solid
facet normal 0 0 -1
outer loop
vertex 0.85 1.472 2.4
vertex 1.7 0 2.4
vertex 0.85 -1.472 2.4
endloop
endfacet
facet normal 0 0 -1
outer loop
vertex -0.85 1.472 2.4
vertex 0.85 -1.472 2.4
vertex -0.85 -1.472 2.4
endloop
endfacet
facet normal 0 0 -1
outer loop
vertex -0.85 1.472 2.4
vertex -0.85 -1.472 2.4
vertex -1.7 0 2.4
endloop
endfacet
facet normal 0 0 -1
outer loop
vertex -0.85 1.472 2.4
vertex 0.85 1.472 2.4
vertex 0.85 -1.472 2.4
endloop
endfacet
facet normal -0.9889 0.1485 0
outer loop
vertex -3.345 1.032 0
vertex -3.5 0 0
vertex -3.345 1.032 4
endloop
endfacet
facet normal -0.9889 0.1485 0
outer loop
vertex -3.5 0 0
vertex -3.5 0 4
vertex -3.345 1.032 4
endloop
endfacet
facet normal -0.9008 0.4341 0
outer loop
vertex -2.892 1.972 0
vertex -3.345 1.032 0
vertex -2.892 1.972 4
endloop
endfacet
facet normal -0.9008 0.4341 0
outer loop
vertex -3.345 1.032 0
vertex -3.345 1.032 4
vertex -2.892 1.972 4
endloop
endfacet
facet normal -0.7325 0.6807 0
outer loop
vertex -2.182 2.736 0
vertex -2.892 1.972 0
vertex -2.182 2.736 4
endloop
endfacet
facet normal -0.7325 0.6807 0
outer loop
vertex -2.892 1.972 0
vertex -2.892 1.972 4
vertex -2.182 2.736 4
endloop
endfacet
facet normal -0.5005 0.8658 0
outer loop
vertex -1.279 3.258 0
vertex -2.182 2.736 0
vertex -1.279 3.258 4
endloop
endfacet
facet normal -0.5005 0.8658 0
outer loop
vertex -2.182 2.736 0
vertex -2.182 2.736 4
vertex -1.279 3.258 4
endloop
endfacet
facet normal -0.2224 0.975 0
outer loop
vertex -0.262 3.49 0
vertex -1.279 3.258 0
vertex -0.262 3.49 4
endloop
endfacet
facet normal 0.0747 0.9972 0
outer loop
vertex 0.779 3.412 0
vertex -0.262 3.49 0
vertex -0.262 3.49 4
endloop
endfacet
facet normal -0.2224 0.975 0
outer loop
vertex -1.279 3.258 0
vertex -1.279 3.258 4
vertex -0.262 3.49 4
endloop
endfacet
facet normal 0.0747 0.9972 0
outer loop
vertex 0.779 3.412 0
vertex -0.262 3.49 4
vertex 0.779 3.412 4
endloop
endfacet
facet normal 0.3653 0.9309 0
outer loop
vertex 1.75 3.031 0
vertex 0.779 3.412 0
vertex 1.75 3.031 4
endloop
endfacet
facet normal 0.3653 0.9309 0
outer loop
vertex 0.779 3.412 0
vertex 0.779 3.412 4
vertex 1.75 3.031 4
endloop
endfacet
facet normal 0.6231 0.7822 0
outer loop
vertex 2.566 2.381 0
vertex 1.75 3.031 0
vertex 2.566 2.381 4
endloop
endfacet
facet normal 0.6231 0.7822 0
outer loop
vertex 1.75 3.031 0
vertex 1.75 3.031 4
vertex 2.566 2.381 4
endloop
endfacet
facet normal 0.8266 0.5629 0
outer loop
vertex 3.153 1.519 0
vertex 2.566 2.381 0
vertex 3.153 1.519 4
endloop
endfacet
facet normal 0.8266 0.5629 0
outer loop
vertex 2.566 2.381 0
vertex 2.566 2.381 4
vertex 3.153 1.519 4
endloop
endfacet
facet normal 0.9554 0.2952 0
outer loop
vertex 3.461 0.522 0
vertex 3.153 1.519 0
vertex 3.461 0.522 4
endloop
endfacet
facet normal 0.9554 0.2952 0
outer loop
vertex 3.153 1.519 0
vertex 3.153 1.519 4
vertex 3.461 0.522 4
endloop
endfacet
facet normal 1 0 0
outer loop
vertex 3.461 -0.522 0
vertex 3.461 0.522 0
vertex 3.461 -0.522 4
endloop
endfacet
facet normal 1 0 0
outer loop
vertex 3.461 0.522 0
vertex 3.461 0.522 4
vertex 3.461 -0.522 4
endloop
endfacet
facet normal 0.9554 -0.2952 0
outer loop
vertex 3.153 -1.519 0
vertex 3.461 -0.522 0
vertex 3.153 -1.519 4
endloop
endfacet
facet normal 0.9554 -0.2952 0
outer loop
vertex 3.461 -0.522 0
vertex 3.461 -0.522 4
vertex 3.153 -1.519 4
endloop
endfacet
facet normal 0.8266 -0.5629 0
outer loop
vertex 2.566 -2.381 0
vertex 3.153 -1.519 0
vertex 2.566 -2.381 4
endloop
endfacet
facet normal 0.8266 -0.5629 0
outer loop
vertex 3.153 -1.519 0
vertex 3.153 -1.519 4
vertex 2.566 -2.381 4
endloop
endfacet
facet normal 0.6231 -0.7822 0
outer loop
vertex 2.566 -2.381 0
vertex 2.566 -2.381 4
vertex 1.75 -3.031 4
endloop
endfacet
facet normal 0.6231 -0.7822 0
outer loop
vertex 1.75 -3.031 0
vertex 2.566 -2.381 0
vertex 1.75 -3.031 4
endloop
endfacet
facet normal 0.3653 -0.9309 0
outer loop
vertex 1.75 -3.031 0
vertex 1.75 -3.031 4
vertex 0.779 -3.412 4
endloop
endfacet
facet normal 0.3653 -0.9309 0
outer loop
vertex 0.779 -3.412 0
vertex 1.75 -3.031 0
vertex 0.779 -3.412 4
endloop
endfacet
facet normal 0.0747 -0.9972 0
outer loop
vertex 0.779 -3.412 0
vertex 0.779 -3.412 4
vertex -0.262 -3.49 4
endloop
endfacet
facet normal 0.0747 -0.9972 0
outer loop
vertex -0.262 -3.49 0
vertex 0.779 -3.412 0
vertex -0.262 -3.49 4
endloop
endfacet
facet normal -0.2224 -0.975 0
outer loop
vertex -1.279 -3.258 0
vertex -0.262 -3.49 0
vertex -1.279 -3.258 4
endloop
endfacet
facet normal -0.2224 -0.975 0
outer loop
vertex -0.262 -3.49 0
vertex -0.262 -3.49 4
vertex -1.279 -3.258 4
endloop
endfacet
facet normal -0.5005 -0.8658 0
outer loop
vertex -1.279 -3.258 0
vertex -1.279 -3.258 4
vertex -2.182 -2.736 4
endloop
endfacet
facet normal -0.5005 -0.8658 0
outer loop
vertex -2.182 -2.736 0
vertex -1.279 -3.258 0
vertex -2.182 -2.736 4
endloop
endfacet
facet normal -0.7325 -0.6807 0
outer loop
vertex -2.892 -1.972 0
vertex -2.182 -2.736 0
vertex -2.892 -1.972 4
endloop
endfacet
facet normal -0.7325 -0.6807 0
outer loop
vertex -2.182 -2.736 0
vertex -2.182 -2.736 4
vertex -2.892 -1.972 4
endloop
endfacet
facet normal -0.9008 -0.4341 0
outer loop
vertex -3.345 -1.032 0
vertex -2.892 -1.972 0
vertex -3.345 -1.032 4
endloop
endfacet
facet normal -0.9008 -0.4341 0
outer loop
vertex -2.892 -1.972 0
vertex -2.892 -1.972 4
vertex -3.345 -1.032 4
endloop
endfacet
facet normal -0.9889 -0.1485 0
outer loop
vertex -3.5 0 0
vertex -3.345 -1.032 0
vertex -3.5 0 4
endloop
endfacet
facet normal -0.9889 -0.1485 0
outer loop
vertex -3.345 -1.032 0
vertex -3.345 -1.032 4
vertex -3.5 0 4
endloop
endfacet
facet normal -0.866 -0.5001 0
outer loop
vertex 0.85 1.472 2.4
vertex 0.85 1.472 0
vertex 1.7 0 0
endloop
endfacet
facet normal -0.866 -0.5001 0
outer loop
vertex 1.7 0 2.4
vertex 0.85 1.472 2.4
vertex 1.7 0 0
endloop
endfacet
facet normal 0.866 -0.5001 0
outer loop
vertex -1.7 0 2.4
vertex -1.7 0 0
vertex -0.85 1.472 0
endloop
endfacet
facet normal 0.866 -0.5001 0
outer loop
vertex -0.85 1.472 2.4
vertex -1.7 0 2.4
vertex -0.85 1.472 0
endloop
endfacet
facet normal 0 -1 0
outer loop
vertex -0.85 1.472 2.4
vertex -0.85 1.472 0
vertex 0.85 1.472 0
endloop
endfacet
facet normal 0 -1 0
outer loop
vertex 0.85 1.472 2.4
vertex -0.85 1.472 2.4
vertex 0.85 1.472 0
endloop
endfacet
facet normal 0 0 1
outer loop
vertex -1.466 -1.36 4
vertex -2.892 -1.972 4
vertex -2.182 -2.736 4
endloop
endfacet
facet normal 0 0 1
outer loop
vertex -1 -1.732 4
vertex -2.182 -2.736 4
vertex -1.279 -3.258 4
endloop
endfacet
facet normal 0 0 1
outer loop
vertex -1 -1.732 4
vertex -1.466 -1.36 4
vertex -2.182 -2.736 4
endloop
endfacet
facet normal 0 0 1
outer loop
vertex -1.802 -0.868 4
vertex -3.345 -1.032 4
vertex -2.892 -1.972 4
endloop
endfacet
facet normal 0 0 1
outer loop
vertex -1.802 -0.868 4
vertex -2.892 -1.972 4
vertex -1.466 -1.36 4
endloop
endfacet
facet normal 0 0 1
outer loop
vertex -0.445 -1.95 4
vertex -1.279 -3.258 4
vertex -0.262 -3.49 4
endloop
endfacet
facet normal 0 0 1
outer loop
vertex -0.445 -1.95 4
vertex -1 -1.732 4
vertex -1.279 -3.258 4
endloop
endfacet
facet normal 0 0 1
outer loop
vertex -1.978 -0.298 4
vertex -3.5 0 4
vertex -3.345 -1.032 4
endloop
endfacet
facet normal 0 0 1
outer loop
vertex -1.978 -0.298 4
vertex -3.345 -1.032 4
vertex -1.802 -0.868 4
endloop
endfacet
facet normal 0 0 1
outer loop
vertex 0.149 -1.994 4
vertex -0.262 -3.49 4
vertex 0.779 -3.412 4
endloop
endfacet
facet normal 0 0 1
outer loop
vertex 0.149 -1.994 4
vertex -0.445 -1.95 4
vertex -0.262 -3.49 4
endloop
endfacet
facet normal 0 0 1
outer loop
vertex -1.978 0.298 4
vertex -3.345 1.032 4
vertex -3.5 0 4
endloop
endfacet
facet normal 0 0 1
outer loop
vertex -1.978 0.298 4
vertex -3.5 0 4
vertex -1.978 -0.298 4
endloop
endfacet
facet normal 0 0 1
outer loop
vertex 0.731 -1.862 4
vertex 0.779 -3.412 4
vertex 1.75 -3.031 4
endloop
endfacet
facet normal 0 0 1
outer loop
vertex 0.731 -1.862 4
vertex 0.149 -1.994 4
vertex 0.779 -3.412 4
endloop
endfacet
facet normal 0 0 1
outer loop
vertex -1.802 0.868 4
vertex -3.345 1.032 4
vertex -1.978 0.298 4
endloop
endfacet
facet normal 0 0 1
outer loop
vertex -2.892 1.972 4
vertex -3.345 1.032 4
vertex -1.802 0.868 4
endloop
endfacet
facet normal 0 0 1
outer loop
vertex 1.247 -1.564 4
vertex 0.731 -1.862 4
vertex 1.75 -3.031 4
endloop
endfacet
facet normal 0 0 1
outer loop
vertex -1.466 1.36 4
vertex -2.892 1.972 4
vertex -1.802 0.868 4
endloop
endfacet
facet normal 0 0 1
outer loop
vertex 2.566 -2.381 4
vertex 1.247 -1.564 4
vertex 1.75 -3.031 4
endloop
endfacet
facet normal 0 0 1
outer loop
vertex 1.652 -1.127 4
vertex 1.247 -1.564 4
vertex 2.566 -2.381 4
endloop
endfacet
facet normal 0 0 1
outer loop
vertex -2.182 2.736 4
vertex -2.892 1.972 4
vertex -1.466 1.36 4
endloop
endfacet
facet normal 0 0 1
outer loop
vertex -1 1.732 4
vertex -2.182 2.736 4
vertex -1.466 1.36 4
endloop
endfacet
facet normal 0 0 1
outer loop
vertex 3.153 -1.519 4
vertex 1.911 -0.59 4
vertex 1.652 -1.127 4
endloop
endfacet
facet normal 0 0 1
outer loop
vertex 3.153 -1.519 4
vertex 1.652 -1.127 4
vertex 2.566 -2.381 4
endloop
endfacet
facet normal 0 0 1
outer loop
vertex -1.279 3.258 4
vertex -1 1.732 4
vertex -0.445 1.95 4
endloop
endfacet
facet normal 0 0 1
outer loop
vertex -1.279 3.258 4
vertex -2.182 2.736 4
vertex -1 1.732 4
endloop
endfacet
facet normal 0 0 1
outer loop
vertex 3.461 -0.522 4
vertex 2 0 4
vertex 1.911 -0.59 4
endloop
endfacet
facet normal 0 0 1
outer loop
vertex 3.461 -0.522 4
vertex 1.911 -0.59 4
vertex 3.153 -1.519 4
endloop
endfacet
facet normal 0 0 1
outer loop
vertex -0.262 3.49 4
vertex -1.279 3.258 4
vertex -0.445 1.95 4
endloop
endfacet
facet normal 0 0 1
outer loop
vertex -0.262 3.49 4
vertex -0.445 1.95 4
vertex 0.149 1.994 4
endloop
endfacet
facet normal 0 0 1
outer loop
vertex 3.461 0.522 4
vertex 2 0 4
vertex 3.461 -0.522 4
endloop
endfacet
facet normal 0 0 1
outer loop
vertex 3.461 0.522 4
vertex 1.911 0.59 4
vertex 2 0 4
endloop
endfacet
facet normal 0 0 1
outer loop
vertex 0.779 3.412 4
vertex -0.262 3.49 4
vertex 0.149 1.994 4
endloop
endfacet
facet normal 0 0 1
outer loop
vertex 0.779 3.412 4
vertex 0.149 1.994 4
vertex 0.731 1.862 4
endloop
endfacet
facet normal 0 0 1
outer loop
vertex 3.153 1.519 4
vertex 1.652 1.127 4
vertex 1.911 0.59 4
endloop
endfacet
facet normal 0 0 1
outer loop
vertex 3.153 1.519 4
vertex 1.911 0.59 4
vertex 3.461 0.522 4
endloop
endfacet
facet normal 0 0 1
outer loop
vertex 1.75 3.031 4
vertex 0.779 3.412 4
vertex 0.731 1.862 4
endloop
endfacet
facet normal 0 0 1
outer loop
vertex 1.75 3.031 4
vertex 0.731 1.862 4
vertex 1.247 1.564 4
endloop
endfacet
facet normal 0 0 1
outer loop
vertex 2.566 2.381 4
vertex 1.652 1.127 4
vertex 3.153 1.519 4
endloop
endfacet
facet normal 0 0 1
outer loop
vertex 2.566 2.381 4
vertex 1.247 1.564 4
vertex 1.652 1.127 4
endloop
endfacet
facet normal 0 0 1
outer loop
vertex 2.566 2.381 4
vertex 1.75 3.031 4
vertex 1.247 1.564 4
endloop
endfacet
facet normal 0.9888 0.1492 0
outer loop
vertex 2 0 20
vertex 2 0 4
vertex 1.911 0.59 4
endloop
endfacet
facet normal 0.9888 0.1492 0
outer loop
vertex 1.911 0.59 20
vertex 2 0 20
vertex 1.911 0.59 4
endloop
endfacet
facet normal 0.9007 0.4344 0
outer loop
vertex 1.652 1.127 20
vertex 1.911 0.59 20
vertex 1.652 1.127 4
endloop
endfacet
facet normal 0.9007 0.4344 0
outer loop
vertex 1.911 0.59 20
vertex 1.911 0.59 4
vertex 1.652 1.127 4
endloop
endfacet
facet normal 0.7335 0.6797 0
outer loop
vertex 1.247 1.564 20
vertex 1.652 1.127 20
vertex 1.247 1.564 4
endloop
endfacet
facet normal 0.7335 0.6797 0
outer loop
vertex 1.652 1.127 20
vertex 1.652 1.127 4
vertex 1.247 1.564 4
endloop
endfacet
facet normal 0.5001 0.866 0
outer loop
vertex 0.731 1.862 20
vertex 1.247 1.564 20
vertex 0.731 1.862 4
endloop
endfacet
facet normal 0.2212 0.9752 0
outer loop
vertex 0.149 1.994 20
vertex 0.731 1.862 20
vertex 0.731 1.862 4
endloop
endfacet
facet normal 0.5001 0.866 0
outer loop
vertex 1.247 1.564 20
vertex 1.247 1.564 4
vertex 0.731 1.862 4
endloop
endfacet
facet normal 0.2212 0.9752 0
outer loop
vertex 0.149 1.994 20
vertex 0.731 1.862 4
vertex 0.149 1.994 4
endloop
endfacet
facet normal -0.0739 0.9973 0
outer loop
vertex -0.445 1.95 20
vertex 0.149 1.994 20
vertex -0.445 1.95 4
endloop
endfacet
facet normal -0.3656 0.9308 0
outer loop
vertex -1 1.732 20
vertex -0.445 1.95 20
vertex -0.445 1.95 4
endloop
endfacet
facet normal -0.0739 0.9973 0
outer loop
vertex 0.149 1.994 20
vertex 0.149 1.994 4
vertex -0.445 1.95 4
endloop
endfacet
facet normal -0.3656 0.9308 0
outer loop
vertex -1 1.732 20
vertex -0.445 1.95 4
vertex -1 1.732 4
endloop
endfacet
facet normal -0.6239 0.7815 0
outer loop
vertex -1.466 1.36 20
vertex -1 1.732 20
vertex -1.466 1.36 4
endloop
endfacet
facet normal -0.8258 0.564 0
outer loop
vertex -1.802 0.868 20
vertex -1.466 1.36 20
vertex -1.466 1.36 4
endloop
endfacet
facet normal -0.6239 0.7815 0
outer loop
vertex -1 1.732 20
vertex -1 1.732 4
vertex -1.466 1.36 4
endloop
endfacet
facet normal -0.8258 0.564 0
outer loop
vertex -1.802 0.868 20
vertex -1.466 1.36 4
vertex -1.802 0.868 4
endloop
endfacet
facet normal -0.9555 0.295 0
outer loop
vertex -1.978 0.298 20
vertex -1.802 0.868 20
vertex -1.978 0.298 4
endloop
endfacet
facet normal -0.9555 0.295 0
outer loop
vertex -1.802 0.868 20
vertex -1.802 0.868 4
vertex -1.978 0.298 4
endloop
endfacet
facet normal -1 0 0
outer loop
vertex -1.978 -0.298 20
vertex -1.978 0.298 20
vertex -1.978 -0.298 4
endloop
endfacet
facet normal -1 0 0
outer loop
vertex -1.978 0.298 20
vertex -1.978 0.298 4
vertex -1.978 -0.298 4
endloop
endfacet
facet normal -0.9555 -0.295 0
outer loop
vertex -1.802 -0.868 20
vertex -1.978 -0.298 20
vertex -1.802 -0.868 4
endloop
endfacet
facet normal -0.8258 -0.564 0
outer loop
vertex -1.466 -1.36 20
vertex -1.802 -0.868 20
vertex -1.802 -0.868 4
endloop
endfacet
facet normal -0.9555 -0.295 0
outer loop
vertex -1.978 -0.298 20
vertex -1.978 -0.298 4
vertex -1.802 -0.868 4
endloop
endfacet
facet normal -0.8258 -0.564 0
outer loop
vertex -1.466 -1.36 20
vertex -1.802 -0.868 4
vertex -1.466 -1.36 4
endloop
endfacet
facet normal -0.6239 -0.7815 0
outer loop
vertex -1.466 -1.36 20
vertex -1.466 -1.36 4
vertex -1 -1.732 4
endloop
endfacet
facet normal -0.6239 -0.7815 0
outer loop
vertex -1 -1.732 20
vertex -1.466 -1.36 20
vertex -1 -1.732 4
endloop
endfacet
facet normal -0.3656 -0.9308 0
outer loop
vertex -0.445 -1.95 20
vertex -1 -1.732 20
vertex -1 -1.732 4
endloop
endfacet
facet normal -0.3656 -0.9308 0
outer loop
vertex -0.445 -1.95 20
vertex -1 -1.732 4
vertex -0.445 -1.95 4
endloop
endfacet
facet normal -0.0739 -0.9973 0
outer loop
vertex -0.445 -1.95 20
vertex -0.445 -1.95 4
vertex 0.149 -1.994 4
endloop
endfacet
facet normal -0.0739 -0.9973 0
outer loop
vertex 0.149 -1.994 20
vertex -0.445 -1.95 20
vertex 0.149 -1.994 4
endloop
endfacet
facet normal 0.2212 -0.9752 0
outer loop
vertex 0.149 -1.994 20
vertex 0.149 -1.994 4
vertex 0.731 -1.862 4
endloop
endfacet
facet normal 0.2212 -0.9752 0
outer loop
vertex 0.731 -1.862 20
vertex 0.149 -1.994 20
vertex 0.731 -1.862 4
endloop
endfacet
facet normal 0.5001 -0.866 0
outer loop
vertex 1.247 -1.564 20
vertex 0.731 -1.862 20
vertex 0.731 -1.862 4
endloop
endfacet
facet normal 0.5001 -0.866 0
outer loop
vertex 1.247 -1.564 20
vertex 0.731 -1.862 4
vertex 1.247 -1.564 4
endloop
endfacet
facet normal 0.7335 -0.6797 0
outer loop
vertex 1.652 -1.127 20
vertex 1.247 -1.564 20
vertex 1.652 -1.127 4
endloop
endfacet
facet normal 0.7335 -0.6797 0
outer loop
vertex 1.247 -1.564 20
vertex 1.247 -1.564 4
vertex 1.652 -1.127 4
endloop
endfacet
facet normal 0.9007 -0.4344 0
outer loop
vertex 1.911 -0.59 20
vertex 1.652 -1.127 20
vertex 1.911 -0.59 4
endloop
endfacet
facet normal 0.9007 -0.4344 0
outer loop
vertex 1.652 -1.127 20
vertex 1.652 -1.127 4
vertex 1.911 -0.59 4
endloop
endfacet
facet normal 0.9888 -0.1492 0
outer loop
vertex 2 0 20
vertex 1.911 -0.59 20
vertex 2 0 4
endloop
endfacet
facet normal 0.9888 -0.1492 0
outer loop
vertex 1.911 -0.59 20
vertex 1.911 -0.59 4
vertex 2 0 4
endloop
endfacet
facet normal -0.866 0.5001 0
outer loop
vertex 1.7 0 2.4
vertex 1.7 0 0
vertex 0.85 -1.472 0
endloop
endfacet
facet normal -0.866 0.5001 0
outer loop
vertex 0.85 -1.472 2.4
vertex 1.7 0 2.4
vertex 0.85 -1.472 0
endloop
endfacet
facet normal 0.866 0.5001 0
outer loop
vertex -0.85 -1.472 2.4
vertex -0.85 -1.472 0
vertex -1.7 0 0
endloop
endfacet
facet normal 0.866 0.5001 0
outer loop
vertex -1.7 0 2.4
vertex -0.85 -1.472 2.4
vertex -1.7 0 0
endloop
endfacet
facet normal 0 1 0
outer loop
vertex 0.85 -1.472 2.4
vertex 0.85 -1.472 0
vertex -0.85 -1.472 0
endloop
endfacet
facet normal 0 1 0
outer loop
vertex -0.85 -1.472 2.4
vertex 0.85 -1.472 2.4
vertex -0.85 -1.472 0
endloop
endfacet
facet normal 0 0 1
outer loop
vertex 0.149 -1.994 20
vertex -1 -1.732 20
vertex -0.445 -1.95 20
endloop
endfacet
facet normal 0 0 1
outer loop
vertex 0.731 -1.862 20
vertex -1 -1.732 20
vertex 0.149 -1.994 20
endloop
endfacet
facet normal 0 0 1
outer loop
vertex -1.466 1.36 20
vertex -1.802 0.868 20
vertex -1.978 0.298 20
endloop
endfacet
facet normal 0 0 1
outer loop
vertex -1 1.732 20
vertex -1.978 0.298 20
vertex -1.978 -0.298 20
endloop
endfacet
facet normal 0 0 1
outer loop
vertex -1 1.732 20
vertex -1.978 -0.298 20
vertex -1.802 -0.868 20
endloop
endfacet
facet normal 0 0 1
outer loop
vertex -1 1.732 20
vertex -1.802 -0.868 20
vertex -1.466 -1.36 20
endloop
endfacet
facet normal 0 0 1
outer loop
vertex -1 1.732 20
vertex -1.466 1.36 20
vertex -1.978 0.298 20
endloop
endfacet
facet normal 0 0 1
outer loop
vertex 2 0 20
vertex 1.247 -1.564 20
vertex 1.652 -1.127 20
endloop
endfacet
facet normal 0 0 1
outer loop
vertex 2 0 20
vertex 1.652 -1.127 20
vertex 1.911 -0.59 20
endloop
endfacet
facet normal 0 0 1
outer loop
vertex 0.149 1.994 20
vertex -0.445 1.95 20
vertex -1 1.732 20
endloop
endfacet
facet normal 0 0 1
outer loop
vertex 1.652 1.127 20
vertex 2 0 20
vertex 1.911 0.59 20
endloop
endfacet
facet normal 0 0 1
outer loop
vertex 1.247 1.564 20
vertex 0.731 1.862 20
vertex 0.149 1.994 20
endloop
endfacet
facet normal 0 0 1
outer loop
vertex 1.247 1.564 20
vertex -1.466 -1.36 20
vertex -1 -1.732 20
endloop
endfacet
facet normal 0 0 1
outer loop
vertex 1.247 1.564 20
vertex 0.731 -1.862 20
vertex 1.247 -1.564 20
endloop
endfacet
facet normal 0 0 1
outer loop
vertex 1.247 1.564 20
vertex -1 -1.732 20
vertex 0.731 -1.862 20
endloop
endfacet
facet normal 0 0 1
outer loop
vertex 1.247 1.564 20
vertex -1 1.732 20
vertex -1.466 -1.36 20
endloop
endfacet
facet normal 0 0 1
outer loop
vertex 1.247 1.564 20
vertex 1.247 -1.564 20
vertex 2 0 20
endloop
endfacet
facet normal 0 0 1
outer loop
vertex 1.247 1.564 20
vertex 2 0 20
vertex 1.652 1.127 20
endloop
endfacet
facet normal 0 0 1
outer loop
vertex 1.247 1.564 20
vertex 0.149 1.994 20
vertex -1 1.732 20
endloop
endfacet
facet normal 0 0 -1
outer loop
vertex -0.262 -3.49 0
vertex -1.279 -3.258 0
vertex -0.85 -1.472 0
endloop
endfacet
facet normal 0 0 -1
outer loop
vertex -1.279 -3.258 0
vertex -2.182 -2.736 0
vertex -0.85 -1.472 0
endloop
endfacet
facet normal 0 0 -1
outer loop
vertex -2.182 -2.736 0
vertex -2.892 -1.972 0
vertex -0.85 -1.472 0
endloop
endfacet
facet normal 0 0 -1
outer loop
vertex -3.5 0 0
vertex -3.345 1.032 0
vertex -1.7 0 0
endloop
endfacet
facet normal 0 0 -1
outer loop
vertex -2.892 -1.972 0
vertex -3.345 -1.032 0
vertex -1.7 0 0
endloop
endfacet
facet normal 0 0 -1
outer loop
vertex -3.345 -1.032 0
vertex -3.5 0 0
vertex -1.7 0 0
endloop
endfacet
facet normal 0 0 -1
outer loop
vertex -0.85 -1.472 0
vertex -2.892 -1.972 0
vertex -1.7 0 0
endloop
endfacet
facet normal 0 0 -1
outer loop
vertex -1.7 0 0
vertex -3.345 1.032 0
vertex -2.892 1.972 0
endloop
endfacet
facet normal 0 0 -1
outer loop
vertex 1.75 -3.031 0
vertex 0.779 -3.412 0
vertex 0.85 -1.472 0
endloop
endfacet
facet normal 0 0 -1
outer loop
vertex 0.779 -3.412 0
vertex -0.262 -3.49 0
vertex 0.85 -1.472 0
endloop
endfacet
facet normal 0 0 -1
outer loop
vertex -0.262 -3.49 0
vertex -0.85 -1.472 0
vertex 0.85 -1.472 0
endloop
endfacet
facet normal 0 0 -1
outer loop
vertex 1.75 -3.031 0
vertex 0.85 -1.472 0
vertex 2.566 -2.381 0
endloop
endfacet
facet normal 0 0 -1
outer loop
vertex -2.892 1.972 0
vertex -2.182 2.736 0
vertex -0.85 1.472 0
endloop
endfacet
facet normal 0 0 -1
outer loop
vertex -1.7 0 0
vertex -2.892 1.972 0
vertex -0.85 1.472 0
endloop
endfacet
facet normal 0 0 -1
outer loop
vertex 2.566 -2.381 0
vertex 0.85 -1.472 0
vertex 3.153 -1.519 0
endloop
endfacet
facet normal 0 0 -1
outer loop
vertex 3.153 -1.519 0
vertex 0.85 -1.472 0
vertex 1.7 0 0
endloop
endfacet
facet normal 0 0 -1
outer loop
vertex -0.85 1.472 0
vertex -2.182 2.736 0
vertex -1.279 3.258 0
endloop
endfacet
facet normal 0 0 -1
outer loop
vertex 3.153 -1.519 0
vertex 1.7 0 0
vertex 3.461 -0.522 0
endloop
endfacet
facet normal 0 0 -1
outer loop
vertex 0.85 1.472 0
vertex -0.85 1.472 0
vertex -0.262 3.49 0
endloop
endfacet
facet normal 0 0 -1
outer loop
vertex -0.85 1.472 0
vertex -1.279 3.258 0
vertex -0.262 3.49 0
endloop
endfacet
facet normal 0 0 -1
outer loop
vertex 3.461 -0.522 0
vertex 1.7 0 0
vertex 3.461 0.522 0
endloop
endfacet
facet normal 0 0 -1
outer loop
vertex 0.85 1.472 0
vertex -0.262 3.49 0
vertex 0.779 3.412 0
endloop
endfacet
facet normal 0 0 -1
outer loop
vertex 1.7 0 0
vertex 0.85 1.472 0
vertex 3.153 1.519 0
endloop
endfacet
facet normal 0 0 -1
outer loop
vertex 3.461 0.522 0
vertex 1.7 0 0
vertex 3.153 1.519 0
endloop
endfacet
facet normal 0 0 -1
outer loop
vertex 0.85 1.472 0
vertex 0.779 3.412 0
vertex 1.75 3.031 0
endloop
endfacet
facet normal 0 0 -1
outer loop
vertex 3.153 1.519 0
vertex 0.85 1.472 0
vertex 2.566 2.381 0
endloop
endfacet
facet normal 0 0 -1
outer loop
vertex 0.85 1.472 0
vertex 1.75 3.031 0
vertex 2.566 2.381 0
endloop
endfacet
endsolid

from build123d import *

# Parameters (mm, degrees)
SKETCH1_W           = 3.5
SKETCH1_H           = 4
SKETCH2_R           = 2
BOSS_EXTRUDE1_DEPTH = 16
CUT_EXTRUDE1_DEPTH  = 2.4


with BuildPart() as part:
    # Sketch1 → Revolve1 (revolve)
    with BuildSketch(Plane.XZ, mode=Mode.PRIVATE) as revolve1_sk:
        with Locations((1.75, 2)):
            Rectangle(SKETCH1_W, SKETCH1_H)
    revolve(revolve1_sk.sketch.rotate(Axis((0, 0, 4), (0, 0, -1)), 180), axis=Axis((0, 0, 4), (0, 0, -1)))

    # Sketch2 → Boss-Extrude1 (add)
    with BuildSketch(Plane.XY.offset(4)):
        Circle(SKETCH2_R)
    extrude(amount=BOSS_EXTRUDE1_DEPTH)

    # Sketch3 → Cut-Extrude1 (cut)
    with BuildSketch(Plane(origin=(0, 0, 0), x_dir=(-1, 0, 0), z_dir=(0, 0, -1))):
        Polygon((-1.7, 0), (-0.85, -1.472243186), (0.85, -1.472243186), (1.7, 0), (0.85, 1.472243186), (-0.85, 1.472243186), align=None)
    extrude(amount=-CUT_EXTRUDE1_DEPTH, mode=Mode.SUBTRACT)


solid = part.part
